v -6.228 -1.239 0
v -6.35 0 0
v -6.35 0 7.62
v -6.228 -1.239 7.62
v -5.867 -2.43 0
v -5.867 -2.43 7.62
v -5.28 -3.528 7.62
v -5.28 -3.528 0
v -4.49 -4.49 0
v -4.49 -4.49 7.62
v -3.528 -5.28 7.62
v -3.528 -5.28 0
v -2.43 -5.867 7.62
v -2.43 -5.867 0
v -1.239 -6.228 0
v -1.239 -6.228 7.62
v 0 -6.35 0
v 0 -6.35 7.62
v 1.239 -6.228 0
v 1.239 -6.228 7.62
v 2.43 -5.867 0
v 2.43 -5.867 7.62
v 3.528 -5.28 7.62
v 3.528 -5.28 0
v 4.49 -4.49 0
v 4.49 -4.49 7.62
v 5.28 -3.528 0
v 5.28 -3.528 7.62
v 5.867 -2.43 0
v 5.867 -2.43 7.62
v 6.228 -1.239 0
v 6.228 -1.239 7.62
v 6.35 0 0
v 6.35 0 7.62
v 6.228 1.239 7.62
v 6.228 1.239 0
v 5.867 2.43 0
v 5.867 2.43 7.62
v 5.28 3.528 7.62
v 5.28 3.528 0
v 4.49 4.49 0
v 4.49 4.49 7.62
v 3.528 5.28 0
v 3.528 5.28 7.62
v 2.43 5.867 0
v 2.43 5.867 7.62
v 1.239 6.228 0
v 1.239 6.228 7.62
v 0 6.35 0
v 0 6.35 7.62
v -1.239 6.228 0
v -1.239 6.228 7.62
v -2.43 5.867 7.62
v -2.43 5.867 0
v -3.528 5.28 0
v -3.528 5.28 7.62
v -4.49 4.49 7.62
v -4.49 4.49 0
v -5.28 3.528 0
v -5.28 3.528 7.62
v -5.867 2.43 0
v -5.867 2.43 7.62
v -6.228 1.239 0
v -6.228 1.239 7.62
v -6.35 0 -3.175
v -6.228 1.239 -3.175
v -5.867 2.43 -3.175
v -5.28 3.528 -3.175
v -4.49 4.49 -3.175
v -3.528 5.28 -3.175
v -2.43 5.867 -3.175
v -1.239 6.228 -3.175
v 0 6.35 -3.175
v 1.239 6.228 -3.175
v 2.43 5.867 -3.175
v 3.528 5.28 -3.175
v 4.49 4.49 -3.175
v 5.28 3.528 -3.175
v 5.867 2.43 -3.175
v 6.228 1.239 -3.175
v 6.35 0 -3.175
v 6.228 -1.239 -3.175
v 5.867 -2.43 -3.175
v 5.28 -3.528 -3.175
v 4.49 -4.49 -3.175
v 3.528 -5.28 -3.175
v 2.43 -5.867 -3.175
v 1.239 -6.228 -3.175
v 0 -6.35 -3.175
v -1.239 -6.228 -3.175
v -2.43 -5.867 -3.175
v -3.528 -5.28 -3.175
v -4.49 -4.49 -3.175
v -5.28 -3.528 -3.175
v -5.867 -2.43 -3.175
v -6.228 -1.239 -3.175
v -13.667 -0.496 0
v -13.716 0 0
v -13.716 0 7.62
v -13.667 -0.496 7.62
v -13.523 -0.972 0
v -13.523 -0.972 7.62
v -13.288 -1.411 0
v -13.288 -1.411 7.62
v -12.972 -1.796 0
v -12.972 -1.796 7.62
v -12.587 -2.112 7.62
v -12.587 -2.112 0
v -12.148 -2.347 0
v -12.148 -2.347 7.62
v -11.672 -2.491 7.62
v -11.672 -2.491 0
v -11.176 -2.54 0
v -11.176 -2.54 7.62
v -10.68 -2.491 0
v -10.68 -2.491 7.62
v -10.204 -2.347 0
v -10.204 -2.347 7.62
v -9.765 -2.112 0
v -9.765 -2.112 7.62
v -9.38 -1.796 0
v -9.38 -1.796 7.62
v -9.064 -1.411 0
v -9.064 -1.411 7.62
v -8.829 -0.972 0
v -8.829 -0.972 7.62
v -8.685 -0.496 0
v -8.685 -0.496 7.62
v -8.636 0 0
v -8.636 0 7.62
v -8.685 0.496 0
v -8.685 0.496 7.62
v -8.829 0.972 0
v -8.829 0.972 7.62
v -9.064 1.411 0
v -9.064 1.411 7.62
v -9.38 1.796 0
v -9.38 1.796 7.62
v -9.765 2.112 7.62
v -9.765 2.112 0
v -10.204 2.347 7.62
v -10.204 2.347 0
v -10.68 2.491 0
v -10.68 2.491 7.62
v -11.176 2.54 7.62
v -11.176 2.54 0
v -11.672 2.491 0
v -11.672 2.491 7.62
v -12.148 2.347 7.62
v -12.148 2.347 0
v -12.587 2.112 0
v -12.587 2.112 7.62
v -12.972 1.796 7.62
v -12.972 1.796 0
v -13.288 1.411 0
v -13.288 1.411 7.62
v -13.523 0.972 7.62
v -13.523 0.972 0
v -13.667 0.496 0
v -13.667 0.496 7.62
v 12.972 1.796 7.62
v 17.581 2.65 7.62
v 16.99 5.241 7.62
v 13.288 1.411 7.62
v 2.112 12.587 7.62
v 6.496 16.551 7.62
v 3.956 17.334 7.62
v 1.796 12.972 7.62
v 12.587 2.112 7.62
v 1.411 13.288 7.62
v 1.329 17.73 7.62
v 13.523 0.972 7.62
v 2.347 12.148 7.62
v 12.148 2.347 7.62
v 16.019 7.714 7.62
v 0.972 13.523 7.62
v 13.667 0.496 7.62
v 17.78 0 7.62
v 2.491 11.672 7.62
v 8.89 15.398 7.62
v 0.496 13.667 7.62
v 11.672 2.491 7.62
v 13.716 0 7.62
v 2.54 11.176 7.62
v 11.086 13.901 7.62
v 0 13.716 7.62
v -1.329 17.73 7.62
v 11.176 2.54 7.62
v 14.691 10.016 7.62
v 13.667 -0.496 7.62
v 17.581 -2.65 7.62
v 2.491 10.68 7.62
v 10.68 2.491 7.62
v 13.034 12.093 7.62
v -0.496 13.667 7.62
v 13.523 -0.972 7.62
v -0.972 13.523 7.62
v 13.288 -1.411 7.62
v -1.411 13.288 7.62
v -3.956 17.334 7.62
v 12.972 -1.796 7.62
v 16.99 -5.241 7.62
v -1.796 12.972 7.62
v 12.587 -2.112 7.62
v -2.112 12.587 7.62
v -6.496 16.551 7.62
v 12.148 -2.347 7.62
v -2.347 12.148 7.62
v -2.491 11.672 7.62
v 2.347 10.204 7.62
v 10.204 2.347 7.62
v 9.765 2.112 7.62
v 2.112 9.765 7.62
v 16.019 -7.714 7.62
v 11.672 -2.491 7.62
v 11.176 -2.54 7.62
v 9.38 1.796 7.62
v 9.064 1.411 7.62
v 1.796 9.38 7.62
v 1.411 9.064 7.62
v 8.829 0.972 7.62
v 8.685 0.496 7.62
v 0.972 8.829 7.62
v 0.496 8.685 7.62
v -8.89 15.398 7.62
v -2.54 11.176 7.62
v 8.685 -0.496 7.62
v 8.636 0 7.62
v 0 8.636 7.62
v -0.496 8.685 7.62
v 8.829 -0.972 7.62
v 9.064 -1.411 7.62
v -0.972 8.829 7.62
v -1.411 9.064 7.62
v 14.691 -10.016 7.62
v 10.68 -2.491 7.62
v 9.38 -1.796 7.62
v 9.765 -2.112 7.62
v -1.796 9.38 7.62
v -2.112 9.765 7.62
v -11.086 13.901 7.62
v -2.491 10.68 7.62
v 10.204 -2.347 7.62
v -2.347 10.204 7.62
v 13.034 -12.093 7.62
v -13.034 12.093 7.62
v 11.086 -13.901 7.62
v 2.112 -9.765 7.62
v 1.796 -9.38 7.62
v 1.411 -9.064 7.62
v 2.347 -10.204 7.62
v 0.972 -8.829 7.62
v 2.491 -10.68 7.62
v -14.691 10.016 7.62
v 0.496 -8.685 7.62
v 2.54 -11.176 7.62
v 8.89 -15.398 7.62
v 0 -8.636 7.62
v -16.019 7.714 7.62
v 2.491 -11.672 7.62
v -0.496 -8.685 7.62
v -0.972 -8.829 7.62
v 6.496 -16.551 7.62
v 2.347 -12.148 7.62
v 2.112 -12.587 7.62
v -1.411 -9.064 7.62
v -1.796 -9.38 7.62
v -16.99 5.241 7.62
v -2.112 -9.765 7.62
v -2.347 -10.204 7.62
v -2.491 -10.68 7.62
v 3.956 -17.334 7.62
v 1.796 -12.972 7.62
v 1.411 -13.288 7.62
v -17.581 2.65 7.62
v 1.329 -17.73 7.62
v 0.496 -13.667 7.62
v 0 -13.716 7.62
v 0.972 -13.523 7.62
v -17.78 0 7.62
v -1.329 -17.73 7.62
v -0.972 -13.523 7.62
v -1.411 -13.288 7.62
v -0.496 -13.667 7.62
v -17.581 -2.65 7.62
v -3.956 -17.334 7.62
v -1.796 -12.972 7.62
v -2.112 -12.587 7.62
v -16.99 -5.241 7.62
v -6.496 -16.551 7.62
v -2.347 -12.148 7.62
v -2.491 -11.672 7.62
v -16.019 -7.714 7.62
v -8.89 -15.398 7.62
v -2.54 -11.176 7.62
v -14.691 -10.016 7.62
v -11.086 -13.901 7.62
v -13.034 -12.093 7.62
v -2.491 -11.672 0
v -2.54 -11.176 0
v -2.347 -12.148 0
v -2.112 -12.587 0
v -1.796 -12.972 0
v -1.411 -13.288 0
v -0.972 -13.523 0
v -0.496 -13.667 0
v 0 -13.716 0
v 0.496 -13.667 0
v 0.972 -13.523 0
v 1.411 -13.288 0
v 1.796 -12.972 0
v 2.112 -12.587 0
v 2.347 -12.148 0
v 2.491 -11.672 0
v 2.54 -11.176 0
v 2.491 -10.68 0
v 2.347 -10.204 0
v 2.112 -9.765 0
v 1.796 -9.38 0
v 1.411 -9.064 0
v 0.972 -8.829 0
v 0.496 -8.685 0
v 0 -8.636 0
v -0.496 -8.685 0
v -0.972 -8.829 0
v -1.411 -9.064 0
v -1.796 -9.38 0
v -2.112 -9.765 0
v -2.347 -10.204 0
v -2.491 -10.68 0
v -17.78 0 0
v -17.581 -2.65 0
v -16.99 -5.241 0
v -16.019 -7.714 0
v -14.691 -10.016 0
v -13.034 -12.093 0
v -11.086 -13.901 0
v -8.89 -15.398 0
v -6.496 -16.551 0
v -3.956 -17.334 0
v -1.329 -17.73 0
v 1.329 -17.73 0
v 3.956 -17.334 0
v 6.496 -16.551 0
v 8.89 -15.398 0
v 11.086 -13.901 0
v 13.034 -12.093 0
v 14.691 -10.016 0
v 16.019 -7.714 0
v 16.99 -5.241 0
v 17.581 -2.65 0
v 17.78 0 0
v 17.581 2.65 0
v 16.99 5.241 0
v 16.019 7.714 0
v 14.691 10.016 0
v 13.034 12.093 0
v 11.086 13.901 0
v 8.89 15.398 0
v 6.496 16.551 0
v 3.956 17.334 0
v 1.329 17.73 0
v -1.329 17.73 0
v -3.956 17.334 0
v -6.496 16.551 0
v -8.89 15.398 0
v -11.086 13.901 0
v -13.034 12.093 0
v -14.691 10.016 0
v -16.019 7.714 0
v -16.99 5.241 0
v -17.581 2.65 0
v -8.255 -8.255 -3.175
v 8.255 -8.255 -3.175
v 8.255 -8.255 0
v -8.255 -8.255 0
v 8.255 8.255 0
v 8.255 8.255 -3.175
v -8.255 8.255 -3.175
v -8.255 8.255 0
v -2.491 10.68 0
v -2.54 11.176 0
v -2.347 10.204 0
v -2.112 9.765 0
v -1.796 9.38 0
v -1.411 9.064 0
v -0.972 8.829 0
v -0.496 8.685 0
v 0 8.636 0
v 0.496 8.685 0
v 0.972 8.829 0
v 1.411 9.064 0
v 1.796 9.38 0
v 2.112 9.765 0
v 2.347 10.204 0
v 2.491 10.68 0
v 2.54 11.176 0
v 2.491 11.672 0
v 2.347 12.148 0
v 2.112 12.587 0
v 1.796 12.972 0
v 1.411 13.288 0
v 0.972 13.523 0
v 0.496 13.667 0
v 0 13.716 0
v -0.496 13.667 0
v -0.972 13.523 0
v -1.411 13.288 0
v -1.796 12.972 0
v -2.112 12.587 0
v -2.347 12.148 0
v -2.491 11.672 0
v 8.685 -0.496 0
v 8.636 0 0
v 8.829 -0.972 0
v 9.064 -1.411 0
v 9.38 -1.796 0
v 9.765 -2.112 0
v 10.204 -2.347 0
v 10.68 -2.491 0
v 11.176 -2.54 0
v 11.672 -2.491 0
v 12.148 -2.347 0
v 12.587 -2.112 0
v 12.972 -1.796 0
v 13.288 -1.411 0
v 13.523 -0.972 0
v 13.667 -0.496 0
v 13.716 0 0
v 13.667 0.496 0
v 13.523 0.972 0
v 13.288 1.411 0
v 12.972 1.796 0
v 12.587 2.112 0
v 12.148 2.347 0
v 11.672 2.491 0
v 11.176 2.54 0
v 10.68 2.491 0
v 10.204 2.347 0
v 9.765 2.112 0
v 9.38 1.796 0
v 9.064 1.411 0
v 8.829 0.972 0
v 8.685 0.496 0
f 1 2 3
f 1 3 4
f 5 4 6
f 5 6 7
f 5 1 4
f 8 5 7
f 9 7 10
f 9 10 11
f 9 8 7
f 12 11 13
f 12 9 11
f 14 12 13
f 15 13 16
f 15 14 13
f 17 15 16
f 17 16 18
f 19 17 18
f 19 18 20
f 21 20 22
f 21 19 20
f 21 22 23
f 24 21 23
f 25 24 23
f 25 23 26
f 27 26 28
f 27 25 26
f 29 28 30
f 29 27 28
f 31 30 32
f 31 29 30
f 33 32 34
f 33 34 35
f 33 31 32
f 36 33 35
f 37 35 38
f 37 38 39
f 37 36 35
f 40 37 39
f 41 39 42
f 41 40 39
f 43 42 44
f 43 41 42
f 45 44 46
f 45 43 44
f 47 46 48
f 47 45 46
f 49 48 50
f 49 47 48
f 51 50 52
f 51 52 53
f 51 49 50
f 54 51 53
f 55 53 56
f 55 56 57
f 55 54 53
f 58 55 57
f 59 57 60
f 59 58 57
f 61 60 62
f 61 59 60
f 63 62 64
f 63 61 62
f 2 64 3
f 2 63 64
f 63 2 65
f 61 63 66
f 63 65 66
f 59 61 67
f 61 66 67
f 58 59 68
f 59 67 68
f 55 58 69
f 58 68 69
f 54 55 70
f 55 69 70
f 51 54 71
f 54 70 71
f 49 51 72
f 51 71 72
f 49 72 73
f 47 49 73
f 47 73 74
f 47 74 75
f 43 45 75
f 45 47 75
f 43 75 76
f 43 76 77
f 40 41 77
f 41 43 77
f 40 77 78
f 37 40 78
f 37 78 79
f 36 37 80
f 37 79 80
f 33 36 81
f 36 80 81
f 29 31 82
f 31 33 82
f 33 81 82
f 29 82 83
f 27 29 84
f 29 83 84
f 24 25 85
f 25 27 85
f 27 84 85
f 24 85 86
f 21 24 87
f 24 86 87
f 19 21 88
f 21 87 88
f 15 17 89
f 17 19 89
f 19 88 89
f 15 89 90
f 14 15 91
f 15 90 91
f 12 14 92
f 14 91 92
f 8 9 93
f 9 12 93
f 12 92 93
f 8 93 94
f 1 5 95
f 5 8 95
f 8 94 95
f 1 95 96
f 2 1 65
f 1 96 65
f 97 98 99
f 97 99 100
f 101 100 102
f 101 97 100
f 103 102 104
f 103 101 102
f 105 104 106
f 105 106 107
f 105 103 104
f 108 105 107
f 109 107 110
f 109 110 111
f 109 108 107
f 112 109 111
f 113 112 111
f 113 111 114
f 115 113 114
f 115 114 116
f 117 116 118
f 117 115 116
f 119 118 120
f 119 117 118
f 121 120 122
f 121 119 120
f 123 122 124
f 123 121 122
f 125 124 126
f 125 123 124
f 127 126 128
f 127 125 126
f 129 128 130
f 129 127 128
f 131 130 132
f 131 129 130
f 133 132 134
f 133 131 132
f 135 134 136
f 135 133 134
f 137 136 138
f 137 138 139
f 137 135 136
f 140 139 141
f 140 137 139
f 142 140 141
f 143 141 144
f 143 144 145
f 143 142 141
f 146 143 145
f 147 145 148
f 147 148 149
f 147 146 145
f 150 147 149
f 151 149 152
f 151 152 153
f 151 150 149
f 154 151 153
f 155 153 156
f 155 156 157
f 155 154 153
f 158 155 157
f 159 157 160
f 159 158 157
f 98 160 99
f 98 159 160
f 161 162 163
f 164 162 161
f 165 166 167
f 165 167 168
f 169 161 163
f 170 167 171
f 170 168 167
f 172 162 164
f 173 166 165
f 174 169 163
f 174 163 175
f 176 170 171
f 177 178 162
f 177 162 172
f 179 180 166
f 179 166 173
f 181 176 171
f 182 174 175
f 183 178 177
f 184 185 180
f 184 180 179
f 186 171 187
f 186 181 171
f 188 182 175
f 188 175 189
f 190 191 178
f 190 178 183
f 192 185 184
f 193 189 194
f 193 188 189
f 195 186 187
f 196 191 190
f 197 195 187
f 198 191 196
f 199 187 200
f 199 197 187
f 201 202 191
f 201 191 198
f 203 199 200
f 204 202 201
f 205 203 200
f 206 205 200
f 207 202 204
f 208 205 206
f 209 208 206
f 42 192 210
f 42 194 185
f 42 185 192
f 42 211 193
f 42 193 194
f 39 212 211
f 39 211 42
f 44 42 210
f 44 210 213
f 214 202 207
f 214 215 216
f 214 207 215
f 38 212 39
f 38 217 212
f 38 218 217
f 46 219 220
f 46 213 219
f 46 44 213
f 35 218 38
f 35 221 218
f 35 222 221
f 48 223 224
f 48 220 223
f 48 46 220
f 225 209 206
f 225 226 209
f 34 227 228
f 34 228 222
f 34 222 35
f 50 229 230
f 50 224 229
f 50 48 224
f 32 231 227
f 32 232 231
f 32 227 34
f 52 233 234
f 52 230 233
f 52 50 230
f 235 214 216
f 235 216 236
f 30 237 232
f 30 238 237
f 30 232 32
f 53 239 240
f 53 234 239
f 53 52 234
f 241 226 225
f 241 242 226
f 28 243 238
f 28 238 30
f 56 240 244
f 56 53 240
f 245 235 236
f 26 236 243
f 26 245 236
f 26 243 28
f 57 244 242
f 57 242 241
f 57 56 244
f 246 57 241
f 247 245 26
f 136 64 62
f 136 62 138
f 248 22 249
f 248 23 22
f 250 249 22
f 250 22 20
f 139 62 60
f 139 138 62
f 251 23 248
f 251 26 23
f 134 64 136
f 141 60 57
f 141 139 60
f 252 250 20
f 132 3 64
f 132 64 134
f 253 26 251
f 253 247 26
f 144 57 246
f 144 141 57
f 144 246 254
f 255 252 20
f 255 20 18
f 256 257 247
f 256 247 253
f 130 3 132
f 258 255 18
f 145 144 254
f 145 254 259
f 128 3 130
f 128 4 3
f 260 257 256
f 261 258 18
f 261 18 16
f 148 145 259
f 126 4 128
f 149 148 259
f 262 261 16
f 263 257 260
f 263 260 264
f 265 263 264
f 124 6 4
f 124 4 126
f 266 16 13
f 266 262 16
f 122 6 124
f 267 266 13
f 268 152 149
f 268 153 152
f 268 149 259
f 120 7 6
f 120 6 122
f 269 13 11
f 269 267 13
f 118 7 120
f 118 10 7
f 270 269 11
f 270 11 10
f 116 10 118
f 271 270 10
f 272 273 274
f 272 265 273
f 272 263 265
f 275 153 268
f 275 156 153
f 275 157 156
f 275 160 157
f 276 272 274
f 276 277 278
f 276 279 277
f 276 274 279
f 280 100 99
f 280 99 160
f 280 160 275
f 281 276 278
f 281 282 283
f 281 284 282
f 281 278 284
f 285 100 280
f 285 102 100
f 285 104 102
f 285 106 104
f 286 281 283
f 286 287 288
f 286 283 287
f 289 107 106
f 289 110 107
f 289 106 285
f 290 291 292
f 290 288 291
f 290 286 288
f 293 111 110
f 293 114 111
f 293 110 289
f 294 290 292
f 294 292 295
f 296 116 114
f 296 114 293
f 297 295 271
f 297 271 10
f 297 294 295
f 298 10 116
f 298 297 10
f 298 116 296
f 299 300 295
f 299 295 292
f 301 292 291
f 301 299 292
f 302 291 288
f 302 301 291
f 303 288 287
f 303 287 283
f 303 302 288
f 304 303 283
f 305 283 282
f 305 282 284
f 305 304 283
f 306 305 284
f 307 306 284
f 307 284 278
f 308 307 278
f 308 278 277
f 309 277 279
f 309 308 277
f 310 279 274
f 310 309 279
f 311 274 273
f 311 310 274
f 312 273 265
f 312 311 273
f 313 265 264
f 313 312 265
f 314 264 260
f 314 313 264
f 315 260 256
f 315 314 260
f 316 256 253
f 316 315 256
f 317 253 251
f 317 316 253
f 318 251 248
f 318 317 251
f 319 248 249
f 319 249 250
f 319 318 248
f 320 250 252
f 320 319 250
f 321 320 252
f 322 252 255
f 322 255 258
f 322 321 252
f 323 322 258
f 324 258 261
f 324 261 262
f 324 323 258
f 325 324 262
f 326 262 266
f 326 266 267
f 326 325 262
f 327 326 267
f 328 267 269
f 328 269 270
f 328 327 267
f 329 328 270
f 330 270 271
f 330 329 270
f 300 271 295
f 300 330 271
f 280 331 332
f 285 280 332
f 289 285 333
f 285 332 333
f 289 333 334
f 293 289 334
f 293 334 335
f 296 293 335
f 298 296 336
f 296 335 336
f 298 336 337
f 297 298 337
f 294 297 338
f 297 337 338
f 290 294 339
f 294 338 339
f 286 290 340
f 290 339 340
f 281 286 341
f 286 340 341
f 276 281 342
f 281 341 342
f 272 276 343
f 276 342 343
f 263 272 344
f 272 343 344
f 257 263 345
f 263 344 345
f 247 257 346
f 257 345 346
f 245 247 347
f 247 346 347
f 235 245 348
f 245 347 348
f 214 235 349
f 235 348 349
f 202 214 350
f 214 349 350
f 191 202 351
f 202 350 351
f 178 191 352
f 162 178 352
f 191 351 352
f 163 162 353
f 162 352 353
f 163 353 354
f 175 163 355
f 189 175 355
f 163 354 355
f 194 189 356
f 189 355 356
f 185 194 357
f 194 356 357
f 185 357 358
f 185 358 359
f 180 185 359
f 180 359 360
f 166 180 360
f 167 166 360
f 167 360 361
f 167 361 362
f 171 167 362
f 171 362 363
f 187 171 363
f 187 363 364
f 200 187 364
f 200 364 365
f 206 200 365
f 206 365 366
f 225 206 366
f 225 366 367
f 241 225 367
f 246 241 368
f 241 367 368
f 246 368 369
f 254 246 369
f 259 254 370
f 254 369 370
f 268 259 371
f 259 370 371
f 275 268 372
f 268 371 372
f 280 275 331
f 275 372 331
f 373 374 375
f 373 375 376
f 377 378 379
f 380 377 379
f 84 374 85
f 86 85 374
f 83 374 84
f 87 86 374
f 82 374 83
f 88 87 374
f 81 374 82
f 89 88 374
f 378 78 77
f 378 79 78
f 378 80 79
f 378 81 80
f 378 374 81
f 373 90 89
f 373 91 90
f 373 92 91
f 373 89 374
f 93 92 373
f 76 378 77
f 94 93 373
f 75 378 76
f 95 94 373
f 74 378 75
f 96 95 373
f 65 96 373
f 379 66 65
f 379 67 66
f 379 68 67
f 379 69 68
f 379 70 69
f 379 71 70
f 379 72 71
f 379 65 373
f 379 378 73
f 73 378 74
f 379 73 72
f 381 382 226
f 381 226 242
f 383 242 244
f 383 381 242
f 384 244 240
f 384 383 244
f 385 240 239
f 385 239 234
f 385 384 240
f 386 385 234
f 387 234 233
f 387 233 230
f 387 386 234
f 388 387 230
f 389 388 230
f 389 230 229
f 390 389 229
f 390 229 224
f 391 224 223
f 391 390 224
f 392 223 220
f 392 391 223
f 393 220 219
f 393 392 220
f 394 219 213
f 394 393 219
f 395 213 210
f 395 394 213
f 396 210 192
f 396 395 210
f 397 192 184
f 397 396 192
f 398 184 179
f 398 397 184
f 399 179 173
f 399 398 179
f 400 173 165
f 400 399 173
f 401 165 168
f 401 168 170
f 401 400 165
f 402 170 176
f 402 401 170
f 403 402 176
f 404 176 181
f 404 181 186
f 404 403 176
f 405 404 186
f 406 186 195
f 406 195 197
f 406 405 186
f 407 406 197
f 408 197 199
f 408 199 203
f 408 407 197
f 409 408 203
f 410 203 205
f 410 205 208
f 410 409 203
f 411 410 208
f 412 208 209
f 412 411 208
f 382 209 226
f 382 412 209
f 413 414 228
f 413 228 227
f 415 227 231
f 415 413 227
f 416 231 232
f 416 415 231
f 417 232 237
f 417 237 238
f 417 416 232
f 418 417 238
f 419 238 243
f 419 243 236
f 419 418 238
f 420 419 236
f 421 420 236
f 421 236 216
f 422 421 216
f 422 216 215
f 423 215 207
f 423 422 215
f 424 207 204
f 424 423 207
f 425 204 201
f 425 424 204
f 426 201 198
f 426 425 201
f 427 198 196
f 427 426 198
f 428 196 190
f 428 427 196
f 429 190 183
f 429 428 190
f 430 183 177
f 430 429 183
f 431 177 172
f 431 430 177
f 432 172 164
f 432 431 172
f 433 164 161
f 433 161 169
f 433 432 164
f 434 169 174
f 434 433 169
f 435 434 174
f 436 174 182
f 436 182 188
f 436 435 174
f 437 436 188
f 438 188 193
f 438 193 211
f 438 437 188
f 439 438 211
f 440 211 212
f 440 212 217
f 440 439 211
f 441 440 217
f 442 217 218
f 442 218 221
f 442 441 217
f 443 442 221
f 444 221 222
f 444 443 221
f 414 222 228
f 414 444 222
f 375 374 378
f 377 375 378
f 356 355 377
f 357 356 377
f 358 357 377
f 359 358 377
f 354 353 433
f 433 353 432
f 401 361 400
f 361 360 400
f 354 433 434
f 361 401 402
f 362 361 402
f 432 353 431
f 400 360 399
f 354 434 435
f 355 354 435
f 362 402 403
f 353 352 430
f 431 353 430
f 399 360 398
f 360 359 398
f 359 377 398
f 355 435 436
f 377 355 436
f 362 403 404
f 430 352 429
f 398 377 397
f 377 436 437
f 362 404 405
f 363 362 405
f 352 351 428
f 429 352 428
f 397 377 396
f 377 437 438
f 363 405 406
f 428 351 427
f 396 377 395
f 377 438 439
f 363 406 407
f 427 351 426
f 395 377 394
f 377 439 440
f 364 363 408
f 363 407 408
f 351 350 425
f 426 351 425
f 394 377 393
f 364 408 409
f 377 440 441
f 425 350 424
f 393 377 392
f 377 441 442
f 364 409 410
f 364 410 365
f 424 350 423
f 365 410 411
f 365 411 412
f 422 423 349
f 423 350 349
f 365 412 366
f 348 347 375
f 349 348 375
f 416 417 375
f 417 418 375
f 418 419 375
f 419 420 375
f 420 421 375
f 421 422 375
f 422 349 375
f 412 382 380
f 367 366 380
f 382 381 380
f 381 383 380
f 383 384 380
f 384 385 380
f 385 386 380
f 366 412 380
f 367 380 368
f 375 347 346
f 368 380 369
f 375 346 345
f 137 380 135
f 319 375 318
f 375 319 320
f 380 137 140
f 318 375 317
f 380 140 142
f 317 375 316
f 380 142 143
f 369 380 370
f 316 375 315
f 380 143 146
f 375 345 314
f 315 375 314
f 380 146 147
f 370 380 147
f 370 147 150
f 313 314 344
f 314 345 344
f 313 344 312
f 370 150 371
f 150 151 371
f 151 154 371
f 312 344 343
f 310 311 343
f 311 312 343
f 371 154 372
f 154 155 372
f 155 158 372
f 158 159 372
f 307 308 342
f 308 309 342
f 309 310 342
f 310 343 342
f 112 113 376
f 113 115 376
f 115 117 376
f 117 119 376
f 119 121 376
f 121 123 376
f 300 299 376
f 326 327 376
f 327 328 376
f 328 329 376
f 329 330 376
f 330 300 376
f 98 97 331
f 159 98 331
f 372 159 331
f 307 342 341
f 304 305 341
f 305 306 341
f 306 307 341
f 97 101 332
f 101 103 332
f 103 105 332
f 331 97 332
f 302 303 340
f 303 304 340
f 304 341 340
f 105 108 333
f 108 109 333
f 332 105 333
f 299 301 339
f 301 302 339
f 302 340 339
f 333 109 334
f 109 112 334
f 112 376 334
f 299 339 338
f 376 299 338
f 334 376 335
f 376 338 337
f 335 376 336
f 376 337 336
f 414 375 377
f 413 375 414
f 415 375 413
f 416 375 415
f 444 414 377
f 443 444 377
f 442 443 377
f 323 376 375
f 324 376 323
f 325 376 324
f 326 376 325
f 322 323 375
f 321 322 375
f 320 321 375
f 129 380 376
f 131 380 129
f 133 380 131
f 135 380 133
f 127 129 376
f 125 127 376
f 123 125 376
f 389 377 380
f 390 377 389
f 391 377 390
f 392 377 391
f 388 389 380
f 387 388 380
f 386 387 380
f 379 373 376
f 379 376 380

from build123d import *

# Parameters (mm, degrees)
SKETCH1_R           = 17.78
SKETCH1_R_2         = 2.54
SKETCH1_R_3         = 6.35
BOSS_EXTRUDE1_DEPTH = 7.62
BOSS_EXTRUDE2_START = 3.175
SKETCH2_W           = 16.51
SKETCH2_H           = 16.51
SKETCH2_R           = 6.35
BOSS_EXTRUDE2_DEPTH = 3.175


with BuildPart() as part:
    # Sketch1 → Boss-Extrude1 (new body)
    with BuildSketch(Plane.XY):
        with Locations(Location((0, 0, 0), (0, 0, 180))):
            Circle(SKETCH1_R)
        with Locations(Location((-11.176, 0, 0), (0, 0, 180))):
            Circle(SKETCH1_R_2, mode=Mode.SUBTRACT)
        with Locations(Location((0, -11.176, 0), (0, 0, 180))):
            Circle(SKETCH1_R_2, mode=Mode.SUBTRACT)
        with Locations(Location((11.176, 0, 0), (0, 0, 180))):
            Circle(SKETCH1_R_2, mode=Mode.SUBTRACT)
        with Locations(Location((0, 11.176, 0), (0, 0, 180))):
            Circle(SKETCH1_R_2, mode=Mode.SUBTRACT)
        with Locations(Location((0, 0, 0), (0, 0, 180))):
            Circle(SKETCH1_R_3, mode=Mode.SUBTRACT)
    extrude(amount=BOSS_EXTRUDE1_DEPTH)

    # Sketch2 → Boss-Extrude2 (add)
    with BuildSketch(Plane(origin=(0, 0, 0), x_dir=(-1, 0, 0), z_dir=(0, 0, -1)).offset(BOSS_EXTRUDE2_START)):
        Rectangle(SKETCH2_W, SKETCH2_H)
        Circle(SKETCH2_R, mode=Mode.SUBTRACT)
    extrude(amount=-BOSS_EXTRUDE2_DEPTH)


solid = part.part
